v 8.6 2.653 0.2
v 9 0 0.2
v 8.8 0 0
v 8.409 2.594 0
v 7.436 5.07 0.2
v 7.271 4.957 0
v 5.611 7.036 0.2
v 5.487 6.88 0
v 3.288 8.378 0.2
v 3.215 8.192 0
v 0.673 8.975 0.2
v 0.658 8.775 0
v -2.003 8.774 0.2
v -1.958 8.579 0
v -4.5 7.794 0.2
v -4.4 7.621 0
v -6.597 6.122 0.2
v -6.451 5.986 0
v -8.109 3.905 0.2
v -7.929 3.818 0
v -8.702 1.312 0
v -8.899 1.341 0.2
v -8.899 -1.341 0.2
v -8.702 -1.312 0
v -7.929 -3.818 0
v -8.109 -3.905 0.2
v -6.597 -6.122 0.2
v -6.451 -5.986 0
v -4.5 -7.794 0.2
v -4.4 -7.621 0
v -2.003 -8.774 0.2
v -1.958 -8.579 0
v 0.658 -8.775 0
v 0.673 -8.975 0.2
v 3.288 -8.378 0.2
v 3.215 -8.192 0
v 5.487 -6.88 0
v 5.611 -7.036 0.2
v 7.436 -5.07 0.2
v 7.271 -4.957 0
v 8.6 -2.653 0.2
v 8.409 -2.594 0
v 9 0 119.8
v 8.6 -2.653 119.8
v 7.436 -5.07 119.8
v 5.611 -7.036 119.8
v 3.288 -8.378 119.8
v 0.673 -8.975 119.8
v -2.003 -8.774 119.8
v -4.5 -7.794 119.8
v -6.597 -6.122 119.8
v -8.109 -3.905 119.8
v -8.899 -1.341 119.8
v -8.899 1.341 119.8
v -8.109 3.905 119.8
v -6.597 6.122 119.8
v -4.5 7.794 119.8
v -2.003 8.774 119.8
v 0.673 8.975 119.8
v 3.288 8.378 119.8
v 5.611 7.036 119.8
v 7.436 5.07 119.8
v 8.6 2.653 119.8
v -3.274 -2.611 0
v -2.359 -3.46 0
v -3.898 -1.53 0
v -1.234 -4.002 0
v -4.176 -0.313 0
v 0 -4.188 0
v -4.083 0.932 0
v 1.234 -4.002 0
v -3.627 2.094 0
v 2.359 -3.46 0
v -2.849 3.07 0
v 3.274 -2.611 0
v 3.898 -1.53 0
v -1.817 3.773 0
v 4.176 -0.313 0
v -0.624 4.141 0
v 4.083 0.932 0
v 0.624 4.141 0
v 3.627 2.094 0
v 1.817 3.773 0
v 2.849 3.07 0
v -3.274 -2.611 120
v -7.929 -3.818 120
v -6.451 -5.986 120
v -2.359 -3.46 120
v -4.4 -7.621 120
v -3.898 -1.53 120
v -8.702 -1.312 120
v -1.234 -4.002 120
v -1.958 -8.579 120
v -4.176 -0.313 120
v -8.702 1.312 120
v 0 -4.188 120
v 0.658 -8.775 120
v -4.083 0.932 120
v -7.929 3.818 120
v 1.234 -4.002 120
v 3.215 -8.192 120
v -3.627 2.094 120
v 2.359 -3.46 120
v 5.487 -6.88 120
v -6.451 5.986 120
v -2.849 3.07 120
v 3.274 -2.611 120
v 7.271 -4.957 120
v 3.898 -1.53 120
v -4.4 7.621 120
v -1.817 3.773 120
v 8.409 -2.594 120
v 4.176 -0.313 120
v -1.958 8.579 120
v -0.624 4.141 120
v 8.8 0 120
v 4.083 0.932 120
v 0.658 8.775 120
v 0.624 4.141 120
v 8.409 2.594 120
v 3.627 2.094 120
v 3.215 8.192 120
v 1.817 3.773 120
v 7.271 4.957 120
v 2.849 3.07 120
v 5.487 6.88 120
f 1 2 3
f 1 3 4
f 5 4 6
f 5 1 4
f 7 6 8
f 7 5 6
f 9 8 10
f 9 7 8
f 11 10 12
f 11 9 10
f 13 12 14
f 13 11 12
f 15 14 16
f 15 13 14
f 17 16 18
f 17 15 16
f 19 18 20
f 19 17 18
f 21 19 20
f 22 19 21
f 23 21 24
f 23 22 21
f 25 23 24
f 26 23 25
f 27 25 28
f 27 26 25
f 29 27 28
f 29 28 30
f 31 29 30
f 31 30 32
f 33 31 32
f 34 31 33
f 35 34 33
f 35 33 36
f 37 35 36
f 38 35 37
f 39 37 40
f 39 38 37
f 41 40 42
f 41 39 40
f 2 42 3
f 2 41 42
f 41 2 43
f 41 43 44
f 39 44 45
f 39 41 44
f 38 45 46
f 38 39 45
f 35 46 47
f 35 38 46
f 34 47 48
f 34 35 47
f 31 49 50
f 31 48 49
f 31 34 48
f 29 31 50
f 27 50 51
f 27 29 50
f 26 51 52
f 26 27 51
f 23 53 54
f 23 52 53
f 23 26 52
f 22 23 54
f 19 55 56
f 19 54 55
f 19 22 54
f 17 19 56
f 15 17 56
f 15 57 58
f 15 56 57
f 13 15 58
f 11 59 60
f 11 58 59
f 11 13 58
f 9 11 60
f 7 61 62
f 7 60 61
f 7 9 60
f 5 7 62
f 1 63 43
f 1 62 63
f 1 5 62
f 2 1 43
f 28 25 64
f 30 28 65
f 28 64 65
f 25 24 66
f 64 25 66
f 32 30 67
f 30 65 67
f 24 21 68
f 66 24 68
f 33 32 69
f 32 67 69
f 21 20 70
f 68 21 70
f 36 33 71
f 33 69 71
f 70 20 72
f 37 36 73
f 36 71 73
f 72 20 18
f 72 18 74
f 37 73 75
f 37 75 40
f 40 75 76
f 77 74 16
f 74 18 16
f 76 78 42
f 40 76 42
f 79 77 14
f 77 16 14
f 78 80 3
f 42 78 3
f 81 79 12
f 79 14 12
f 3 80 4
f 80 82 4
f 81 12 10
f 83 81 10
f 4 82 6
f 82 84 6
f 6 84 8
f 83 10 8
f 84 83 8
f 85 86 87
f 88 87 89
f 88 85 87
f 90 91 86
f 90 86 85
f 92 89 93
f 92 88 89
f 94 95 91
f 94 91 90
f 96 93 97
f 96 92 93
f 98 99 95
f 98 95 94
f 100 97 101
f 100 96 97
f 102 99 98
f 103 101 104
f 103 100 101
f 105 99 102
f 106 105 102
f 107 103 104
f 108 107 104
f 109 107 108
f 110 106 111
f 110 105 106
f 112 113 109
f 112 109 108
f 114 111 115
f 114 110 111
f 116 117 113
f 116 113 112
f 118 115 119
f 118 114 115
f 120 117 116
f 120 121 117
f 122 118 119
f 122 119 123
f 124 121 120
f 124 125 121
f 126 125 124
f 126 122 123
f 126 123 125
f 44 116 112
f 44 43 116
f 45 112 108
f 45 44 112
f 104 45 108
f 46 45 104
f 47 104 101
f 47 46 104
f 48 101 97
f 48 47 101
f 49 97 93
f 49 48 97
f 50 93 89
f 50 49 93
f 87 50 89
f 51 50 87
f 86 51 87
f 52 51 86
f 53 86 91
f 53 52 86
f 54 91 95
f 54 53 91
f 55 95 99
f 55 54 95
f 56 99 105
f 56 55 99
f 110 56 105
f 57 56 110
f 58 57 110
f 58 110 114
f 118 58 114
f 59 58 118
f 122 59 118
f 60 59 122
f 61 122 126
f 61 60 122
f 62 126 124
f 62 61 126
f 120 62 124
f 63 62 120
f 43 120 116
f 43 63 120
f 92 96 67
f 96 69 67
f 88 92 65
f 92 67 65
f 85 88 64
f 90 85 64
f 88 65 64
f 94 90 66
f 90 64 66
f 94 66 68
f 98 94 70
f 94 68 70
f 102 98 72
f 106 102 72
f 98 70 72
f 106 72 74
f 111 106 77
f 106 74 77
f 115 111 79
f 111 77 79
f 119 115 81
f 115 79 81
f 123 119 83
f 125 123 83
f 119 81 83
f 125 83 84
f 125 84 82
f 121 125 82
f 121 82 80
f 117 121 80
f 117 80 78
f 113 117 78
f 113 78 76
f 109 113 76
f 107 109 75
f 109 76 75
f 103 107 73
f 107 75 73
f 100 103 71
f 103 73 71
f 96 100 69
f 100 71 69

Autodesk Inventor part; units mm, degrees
ref_plane "YZ Plane" through (0, 0, 0) normal (1, 0, 0) x (0, 1, 0)
ref_plane "XZ Plane" through (0, 0, 0) normal (0, 1, 0) x (-1, 0, 0)
ref_plane "XY Plane" through (0, 0, 0) normal (0, 0, 1) x (1, 0, 0)
sketch "Sketch1" plane through (0, 0, 0) normal (0, 0, 1) x (1, 0, 0)
  circle A0 centre (0, 0) radius 9
  circle A1 centre (0, 0) radius 7
  dimension "d0" = 18
  dimension "d1" = 2
extrude "Extrusion1" add sketch "Sketch1" along normal blind 120 contours A0 | A1
chamfer "Chamfer1" distance 0.2 angle 45 2 edges at (-9, 0, 0) (-9, 0, 120)
sketch "Sketch2" plane through (0, 0, 120) normal (0, 0, 1) x (1, 0, 0)
  circle A0 centre (0, 0) radius 9 projected
hole "Hole1" at (0, 0, 120) direction (0, 0, -1) diameter 8.376 end through all thread size "M10x1.5" class "6H" standard "ISO Metric profile"
properties part number "buis 18 mm" material "Stainless Steel"
